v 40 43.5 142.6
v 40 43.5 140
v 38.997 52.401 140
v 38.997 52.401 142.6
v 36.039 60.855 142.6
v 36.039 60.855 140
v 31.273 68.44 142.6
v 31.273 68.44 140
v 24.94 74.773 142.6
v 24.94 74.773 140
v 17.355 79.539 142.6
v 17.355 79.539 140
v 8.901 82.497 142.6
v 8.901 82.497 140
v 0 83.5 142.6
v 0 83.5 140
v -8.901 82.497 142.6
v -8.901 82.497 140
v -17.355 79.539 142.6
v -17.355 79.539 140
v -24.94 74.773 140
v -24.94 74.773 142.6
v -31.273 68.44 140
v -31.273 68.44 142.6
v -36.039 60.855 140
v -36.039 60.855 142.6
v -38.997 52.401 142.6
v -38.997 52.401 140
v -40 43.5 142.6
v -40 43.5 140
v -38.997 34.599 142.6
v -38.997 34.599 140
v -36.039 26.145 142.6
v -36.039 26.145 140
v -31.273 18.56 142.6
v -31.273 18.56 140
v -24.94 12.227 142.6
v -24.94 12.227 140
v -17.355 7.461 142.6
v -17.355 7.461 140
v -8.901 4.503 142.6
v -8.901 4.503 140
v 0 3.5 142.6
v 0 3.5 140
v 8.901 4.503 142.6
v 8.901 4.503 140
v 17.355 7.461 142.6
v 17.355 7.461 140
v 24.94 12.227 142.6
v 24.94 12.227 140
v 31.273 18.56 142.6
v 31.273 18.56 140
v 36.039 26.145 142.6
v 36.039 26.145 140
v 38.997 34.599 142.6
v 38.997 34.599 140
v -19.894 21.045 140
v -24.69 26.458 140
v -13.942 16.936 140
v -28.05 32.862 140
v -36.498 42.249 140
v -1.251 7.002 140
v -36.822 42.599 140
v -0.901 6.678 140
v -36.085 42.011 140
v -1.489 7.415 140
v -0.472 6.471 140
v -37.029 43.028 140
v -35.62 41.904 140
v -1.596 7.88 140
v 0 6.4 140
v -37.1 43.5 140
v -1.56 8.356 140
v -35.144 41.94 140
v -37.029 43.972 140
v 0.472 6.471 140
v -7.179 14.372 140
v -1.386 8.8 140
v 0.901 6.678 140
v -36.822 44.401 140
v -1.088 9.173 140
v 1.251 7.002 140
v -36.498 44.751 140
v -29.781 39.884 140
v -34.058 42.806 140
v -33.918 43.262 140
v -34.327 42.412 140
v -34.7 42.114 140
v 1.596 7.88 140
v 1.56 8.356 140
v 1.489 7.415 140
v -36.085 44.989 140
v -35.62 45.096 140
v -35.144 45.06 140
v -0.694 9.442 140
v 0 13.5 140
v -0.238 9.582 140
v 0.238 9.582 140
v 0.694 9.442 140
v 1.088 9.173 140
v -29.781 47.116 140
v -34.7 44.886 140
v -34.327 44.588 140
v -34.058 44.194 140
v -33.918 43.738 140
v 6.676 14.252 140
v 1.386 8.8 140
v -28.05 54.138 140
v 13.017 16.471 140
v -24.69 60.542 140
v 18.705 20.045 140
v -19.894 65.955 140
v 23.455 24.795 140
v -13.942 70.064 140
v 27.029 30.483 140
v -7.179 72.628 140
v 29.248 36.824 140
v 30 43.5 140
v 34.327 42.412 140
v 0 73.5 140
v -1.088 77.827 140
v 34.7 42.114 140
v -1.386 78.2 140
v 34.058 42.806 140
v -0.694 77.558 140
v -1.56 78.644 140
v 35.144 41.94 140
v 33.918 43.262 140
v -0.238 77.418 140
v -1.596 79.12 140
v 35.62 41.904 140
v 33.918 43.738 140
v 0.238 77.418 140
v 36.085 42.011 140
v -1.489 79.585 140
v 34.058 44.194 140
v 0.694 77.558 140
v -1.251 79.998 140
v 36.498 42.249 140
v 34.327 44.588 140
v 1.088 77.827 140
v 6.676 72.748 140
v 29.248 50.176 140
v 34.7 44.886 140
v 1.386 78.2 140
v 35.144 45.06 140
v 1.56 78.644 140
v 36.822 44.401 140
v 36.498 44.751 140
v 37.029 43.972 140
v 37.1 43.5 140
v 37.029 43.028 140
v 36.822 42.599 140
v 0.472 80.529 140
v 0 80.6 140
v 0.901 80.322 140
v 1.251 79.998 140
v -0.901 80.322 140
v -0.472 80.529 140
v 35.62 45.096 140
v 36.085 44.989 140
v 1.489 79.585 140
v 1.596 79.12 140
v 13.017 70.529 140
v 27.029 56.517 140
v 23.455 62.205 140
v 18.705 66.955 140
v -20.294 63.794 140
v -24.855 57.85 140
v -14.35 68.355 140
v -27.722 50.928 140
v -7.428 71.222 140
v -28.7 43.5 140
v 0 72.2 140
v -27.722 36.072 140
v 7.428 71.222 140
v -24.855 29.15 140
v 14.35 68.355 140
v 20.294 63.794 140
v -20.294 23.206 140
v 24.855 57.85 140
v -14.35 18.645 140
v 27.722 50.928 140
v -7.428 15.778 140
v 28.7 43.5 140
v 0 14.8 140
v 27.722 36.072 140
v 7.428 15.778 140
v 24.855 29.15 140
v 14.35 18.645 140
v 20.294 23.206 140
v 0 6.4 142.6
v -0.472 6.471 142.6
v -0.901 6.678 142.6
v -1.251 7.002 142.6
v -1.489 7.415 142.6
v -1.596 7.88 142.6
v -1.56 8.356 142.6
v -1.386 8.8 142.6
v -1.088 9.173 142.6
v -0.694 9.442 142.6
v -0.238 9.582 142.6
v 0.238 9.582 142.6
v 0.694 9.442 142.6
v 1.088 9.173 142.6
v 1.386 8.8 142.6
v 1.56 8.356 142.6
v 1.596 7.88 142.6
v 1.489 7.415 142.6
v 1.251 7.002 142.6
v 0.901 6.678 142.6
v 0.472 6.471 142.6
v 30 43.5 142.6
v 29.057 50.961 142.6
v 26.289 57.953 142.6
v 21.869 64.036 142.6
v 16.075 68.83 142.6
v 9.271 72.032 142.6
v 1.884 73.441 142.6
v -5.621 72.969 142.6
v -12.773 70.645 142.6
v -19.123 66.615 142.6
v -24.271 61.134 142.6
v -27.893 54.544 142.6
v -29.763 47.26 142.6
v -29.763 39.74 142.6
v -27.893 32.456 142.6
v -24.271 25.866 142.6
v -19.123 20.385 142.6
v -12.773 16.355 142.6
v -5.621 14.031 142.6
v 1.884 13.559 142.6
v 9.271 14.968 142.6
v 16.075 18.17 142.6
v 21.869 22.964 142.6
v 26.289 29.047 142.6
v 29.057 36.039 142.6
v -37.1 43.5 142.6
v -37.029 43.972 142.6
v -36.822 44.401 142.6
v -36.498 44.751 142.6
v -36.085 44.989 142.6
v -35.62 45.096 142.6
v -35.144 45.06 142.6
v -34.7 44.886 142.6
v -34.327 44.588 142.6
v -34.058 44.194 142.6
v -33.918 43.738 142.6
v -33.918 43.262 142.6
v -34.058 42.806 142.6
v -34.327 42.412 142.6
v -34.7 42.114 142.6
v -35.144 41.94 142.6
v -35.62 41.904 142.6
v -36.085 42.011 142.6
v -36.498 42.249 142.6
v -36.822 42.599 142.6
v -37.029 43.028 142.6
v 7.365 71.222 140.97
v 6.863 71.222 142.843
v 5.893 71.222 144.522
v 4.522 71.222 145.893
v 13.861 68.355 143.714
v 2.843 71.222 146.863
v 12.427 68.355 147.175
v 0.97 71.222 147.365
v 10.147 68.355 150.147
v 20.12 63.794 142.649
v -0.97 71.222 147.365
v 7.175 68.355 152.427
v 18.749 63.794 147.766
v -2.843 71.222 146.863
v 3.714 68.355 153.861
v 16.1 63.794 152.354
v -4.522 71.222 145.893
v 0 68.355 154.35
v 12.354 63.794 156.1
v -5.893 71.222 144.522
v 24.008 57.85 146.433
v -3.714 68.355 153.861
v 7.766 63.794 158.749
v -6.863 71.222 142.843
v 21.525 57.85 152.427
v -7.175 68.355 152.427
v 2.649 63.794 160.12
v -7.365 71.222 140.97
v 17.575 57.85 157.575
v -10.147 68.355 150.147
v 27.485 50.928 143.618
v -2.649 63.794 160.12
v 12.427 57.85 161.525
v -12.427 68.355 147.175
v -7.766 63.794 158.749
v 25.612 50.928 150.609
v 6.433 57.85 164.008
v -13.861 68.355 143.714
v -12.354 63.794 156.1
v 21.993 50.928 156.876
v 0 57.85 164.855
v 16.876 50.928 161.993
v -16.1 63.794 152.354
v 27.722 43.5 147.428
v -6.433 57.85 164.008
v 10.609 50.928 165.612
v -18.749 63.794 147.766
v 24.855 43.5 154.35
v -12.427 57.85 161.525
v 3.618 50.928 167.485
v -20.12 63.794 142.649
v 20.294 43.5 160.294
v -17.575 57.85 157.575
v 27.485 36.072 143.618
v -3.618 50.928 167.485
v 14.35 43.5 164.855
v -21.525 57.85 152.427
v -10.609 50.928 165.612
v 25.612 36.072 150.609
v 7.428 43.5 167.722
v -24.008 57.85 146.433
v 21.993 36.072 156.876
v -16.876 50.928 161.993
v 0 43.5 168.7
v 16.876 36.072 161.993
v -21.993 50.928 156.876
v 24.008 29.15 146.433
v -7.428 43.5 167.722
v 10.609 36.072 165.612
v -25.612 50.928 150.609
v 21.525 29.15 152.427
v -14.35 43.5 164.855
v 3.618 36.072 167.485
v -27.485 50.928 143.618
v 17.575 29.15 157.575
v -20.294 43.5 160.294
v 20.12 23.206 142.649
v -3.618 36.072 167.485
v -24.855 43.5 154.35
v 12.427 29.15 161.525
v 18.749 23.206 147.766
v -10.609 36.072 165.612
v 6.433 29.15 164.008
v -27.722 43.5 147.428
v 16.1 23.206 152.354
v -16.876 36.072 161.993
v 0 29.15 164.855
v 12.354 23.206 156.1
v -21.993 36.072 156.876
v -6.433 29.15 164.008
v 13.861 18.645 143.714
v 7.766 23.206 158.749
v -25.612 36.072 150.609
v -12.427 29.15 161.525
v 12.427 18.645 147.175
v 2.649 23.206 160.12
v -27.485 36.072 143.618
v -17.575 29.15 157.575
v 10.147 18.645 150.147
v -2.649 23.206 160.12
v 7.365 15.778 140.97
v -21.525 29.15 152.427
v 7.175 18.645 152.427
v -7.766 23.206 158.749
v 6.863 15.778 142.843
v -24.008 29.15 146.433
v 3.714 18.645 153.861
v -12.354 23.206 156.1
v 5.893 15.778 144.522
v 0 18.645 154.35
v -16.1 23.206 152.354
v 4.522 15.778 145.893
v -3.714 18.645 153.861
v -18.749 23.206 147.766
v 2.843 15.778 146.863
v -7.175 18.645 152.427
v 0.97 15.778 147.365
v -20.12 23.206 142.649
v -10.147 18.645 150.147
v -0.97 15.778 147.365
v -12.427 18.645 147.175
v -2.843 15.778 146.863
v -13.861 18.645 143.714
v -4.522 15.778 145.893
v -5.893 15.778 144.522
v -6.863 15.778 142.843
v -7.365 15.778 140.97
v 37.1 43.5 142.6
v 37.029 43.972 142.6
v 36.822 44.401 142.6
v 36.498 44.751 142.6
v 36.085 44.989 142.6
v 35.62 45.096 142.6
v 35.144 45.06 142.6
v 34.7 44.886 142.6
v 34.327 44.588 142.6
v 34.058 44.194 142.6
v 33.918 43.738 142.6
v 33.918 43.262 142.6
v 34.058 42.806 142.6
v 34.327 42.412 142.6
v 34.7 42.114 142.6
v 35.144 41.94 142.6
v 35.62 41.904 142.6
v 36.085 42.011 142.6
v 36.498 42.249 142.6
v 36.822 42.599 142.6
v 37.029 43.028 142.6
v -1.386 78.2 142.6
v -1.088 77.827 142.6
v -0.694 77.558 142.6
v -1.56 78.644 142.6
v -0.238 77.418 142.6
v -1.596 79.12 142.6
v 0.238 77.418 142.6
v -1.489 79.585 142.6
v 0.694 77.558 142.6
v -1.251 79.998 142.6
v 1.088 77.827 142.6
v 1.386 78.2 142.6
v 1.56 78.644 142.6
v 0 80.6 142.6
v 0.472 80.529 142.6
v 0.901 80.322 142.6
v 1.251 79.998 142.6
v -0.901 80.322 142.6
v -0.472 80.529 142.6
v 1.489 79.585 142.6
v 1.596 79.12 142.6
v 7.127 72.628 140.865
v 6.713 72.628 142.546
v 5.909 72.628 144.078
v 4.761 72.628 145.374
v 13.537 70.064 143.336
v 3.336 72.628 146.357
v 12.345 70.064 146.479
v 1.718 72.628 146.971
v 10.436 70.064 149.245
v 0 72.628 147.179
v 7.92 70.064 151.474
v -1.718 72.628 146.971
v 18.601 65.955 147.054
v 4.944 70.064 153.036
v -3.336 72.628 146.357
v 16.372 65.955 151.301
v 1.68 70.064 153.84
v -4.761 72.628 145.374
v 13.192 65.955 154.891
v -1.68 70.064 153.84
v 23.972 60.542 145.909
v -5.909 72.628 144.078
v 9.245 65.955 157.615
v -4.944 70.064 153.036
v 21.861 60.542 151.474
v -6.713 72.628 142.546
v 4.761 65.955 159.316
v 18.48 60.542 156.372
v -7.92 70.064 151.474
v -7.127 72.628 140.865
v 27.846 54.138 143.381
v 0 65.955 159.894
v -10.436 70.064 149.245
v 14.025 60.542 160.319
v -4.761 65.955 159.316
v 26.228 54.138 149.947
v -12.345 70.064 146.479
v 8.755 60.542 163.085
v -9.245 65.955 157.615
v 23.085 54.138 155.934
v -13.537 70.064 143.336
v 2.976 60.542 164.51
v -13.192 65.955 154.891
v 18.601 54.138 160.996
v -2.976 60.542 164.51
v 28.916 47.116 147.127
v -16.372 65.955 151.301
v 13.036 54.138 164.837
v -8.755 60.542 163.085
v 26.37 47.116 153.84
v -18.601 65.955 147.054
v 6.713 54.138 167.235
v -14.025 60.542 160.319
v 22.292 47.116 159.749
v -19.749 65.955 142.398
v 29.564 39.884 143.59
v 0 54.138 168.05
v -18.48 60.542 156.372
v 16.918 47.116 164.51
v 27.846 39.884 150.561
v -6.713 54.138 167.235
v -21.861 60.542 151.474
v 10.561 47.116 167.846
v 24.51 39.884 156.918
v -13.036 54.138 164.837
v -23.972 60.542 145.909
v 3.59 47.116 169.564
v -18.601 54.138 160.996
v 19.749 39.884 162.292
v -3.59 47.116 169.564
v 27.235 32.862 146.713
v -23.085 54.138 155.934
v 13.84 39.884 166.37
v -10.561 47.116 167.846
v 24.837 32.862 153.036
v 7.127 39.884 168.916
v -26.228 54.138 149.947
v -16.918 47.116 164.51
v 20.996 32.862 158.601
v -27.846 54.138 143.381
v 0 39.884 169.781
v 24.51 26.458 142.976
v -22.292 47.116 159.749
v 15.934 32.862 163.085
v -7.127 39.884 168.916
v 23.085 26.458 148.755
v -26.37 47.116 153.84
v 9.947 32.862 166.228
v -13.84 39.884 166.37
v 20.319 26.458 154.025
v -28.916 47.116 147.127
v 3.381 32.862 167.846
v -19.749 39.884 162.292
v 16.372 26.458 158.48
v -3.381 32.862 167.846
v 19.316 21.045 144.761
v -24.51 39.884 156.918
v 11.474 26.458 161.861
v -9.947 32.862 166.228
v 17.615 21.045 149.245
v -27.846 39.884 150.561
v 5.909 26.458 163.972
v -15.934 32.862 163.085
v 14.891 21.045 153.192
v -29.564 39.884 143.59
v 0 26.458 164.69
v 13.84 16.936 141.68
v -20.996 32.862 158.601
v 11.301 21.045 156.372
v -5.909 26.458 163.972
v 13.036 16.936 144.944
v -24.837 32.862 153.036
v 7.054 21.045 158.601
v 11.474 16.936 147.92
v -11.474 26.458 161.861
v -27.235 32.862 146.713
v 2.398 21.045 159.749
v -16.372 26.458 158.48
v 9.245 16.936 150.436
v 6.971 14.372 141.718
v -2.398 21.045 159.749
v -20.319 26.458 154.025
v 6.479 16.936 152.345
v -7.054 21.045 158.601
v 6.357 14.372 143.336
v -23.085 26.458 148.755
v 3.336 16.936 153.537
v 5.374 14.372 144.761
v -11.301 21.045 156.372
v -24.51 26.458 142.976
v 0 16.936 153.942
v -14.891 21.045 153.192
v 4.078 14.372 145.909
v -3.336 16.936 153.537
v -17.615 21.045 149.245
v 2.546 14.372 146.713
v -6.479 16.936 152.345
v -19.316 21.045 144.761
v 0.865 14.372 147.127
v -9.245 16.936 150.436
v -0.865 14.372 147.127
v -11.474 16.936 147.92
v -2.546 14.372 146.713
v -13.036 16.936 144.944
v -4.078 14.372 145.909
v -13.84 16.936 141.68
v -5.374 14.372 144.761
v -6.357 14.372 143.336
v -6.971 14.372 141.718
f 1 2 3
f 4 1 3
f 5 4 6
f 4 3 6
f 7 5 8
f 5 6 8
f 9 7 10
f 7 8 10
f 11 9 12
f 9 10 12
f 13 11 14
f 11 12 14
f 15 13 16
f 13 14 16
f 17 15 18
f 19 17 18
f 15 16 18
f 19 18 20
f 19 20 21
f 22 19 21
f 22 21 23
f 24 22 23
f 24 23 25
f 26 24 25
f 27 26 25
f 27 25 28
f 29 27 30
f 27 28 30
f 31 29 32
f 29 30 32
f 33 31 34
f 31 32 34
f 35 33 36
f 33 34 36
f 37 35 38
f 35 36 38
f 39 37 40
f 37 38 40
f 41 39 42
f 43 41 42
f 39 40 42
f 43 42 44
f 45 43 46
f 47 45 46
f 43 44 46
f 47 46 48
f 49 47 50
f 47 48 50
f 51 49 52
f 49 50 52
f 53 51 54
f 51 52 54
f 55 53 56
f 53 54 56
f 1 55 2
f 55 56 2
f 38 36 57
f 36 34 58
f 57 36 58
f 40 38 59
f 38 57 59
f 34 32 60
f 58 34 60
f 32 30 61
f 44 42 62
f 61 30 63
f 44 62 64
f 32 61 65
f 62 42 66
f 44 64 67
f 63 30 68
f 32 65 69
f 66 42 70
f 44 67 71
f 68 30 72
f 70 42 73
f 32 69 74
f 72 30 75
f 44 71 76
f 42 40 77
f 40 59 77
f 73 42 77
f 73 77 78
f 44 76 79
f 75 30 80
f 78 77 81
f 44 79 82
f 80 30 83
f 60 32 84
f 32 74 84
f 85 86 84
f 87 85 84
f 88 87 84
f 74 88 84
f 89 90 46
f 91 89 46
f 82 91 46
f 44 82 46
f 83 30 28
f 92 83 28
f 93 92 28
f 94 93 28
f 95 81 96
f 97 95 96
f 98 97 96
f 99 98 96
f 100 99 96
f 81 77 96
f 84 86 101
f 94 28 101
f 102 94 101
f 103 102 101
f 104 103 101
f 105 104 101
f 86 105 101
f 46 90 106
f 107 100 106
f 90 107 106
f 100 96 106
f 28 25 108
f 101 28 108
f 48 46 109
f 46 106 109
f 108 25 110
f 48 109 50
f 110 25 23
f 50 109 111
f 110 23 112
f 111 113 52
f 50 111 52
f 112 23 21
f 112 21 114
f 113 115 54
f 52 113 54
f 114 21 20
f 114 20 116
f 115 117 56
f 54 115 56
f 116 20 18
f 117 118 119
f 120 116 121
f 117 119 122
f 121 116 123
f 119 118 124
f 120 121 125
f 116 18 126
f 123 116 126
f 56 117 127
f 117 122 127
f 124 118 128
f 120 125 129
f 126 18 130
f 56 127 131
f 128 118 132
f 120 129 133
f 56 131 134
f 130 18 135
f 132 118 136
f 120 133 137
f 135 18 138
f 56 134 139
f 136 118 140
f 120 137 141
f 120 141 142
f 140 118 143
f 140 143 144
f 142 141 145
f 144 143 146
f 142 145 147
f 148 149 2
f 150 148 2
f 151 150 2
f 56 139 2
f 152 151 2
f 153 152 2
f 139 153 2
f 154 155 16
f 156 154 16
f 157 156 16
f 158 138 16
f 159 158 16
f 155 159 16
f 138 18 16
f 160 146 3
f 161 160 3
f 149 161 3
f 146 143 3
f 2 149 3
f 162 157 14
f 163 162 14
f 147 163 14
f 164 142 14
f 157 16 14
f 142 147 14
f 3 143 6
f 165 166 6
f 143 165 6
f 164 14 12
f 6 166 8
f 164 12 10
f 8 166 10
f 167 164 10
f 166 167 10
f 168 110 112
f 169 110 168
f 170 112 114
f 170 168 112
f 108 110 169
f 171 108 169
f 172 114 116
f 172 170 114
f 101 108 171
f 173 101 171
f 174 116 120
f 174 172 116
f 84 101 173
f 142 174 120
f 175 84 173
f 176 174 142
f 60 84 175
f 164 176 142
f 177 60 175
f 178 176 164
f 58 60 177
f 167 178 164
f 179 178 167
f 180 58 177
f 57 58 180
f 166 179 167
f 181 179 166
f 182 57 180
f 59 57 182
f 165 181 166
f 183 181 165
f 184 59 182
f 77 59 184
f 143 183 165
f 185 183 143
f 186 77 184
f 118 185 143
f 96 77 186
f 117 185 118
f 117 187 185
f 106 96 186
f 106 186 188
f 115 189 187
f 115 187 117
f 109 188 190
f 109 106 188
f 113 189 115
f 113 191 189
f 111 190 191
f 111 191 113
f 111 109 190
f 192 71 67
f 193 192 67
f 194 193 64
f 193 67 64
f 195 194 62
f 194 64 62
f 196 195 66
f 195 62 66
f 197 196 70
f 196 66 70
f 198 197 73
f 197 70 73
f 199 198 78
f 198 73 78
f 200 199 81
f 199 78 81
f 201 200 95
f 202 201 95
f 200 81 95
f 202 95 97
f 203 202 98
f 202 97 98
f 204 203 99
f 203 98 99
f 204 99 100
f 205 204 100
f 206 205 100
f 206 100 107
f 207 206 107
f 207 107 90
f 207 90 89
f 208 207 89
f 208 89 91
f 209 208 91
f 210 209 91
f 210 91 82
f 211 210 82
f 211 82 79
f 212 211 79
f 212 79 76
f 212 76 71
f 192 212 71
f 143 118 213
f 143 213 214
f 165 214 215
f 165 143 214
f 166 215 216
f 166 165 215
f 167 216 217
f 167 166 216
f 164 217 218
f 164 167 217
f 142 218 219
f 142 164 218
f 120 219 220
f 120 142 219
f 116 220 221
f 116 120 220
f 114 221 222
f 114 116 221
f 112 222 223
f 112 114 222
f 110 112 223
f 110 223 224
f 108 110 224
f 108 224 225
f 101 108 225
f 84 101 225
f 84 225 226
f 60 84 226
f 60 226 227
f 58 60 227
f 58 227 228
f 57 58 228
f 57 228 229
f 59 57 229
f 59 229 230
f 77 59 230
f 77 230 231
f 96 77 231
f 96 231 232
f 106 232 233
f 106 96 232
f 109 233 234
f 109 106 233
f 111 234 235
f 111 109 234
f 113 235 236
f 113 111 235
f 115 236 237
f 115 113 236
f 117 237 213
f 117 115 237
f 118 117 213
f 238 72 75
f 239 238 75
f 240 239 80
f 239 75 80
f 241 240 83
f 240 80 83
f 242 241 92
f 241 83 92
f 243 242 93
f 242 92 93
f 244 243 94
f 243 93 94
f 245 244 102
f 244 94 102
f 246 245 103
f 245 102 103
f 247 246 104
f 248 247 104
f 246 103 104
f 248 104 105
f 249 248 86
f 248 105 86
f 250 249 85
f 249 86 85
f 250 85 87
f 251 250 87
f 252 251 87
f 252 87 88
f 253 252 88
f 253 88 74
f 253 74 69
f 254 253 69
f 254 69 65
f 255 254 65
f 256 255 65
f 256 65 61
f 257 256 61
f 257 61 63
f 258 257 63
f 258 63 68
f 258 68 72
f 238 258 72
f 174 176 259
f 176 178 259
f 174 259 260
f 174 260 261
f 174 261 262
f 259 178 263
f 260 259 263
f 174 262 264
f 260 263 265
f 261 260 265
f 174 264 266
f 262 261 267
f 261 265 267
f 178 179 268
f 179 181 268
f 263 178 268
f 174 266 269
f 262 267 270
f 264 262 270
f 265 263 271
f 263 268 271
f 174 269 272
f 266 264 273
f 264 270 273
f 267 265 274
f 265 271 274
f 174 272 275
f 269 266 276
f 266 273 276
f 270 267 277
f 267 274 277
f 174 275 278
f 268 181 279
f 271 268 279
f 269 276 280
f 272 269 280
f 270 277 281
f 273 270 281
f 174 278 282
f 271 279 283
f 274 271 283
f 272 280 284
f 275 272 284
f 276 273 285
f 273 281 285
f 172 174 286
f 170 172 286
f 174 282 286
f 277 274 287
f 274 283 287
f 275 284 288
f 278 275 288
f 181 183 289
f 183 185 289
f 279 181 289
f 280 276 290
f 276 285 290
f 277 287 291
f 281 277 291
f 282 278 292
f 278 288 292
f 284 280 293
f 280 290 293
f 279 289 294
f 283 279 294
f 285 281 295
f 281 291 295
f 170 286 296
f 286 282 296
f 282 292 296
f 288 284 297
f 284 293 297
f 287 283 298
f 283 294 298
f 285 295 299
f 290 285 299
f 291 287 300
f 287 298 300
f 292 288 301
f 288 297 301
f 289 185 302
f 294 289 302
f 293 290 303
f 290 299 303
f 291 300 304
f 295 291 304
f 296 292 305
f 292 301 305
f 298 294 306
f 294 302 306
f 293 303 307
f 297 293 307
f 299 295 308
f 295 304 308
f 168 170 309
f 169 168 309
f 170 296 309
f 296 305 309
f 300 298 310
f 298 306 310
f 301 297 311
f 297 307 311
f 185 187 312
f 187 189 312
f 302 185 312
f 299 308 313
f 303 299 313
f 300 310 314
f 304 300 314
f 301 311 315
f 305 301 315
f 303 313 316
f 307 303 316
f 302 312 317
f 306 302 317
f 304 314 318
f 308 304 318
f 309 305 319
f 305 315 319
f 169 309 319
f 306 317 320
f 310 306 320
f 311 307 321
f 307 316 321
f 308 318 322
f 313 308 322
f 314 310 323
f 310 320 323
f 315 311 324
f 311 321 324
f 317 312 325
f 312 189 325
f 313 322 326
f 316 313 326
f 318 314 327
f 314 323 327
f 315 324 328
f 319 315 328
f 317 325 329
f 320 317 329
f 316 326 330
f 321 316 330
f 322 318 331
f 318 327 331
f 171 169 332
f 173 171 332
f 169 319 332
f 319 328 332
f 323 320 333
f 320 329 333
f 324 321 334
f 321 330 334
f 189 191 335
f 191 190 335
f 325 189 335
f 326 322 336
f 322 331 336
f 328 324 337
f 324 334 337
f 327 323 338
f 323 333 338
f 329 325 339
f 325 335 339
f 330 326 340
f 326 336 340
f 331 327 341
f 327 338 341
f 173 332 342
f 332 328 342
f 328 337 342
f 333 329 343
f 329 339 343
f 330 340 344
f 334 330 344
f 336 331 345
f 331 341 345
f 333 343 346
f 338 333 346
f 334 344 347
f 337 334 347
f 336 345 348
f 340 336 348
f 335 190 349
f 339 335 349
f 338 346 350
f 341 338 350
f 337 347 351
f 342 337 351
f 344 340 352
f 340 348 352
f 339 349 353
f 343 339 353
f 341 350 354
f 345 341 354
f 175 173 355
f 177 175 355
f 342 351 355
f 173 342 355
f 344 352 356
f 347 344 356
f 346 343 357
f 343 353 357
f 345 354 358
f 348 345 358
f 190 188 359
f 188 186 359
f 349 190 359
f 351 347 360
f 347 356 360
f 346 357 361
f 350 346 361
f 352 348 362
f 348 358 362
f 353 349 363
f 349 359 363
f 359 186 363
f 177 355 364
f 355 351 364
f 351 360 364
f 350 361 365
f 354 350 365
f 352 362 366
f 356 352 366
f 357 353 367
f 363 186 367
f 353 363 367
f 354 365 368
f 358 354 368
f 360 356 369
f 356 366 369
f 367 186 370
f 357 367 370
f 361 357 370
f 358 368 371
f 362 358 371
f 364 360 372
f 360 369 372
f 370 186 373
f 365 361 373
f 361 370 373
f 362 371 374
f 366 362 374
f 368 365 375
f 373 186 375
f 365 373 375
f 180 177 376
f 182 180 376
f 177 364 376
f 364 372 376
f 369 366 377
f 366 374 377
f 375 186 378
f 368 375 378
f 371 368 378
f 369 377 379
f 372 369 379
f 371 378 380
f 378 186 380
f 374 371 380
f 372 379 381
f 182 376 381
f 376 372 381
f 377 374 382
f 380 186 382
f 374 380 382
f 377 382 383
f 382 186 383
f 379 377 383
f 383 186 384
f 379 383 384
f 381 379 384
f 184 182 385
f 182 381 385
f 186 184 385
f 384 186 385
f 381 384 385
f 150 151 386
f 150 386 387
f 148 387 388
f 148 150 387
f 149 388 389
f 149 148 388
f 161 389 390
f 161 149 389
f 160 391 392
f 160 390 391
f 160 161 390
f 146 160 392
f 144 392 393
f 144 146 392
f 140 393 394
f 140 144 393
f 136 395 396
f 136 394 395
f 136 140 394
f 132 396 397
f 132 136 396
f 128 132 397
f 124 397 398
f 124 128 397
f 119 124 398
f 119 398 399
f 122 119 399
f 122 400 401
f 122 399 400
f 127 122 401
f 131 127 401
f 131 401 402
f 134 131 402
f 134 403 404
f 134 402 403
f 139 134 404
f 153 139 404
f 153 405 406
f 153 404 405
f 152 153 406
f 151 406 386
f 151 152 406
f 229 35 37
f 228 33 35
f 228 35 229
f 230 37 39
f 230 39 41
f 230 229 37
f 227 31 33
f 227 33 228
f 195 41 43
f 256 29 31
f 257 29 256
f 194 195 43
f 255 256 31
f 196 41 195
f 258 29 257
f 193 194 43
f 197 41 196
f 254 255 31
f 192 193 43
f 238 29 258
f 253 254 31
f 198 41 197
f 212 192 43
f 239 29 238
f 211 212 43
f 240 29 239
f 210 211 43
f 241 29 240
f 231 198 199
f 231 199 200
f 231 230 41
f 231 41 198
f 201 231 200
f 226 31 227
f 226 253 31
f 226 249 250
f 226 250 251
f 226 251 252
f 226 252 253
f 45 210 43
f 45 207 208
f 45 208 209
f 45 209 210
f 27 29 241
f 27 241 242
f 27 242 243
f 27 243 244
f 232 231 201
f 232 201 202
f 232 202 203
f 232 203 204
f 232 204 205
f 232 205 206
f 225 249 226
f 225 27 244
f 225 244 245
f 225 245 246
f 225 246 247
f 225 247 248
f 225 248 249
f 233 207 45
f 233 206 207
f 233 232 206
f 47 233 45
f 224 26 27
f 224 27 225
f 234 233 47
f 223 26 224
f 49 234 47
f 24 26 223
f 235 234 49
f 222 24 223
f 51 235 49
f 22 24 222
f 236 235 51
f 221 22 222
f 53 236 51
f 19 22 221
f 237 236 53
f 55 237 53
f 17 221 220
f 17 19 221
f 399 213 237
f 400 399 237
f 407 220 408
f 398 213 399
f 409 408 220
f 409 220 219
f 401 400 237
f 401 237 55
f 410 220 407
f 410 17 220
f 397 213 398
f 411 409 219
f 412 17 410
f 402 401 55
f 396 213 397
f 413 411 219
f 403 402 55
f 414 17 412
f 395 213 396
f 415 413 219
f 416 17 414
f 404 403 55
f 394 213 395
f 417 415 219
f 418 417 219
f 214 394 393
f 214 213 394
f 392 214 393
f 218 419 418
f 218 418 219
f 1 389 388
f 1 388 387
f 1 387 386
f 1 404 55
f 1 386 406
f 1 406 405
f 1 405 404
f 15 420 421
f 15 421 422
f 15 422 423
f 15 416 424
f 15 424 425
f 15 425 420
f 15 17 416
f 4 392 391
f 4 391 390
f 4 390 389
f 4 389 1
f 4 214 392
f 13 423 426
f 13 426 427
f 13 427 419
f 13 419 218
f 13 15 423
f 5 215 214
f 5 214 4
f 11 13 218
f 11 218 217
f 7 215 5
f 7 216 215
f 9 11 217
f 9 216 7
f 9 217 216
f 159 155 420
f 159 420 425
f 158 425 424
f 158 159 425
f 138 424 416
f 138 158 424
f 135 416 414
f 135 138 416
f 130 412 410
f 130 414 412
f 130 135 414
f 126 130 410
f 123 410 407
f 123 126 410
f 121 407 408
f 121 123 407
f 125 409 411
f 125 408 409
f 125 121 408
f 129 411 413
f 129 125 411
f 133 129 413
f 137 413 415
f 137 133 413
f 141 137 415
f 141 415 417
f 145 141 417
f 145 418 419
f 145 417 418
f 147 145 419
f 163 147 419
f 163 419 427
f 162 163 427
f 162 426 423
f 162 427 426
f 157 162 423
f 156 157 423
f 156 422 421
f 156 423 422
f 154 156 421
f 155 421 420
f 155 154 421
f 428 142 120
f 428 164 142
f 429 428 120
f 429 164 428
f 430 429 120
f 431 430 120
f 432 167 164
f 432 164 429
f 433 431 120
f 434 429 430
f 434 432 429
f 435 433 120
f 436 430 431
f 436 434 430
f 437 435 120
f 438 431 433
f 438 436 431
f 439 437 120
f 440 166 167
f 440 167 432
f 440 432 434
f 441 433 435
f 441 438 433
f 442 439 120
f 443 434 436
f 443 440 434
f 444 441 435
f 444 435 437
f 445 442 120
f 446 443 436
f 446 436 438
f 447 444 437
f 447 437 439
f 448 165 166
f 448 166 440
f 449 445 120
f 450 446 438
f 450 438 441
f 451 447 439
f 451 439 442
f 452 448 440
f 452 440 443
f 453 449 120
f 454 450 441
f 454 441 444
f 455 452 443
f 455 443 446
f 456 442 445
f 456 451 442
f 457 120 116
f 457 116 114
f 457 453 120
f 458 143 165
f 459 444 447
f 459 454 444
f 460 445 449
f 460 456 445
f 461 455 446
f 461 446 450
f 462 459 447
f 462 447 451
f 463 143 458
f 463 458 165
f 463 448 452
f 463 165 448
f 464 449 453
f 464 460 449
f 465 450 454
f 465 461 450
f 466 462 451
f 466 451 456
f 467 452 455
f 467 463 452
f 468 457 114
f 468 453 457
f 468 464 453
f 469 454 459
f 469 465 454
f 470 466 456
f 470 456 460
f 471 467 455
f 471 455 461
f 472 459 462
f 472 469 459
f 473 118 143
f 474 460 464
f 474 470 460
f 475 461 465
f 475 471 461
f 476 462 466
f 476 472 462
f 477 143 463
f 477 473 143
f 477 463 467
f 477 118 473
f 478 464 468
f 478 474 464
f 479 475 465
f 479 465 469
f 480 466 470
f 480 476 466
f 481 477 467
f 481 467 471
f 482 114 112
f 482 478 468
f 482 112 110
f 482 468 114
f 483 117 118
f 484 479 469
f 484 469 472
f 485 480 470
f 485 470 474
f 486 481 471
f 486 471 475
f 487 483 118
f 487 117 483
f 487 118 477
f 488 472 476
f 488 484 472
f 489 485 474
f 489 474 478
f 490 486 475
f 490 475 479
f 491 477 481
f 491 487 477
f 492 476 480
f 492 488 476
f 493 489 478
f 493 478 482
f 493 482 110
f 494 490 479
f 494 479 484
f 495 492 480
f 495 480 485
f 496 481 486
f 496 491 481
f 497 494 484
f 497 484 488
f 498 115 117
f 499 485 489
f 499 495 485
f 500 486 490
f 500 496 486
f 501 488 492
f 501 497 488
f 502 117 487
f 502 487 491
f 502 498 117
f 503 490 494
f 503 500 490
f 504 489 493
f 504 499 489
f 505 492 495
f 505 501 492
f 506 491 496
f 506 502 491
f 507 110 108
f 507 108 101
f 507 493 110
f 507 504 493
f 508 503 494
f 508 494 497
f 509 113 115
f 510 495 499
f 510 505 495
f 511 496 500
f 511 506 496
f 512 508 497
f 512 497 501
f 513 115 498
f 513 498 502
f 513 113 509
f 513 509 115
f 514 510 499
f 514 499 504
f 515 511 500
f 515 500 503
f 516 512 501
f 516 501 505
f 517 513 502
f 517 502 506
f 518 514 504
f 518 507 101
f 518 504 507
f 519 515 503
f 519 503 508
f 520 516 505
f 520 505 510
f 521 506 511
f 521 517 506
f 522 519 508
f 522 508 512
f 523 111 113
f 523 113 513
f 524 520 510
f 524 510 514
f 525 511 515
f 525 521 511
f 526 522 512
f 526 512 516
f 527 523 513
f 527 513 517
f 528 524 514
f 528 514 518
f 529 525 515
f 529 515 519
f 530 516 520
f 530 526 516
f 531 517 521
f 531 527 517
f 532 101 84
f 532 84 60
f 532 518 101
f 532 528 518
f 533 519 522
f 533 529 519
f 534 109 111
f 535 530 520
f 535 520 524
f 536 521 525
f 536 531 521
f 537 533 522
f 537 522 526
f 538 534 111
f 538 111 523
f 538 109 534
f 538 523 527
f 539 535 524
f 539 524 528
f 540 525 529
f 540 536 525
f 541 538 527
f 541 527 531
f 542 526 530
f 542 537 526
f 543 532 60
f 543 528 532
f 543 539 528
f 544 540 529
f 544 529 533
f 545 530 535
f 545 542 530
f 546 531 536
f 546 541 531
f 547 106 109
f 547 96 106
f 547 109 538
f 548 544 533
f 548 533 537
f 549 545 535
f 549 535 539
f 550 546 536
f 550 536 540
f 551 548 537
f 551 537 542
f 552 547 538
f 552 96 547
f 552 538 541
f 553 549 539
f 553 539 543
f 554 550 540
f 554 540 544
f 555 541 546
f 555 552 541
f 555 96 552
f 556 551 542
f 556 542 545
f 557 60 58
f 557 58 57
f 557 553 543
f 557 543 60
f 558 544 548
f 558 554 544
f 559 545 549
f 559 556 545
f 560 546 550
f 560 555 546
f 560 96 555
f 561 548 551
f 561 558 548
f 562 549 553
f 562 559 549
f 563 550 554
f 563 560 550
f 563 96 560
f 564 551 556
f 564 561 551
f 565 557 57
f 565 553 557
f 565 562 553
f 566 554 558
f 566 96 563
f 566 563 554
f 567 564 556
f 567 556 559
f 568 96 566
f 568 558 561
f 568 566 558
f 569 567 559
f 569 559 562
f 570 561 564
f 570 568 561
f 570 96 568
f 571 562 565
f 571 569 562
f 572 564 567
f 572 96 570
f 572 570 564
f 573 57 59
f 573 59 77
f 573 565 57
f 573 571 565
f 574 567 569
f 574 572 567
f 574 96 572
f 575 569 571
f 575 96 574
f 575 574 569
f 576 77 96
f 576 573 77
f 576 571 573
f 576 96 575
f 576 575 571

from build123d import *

# Parameters (mm, degrees)
CYLINDER005_R             = 1.6
CYLINDER005_DEPTH         = 10
CYLINDER004_R             = 1.6
CYLINDER004_DEPTH         = 10
FUSION001_PLACEMENT_ANGLE = 90
CYLINDER003_R             = 1.6
CYLINDER003_DEPTH         = 10
CYLINDER002_R             = 1.6
CYLINDER002_DEPTH         = 10
CYLINDER001_R             = 30
CYLINDER001_DEPTH         = 2.6
CYLINDER_R                = 40
CYLINDER_DEPTH            = 2.6
SPHERE001_ANGLE           = 180
SPHERE_ANGLE              = 180


with BuildPart() as cylinder005:
    # Cylinder005 → Cylinder005 (new body)
    with BuildSketch(Plane(origin=(35.5, 0, 0), x_dir=(1, 0, 0), z_dir=(0, 0, 1))):
        Circle(CYLINDER005_R)
    extrude(amount=CYLINDER005_DEPTH)


with BuildPart() as part_mirroring001:
    # Part__Mirroring001: instance of Cylinder005
    add(cylinder005.part.mirror(Plane(origin=(0, 0, 0), x_dir=(0, -1, 0), z_dir=(1, 0, 0))))


with BuildPart() as hole002:
    # Cylinder004 → Cylinder004 (new body)
    with BuildSketch(Plane(origin=(35.5, 0, 0), x_dir=(1, 0, 0), z_dir=(0, 0, 1))):
        Circle(CYLINDER004_R)
    extrude(amount=CYLINDER004_DEPTH)

    # Fusion001: union Part__Mirroring001
    add(part_mirroring001.part)


with BuildPart() as hole002_1:
    # Fusion001 placement: moved
    add(hole002.part.rotate(Axis((0, 0, 0), (0, 0, 1)), FUSION001_PLACEMENT_ANGLE))


with BuildPart() as cylinder003:
    # Cylinder003 → Cylinder003 (new body)
    with BuildSketch(Plane(origin=(35.5, 0, 0), x_dir=(1, 0, 0), z_dir=(0, 0, 1))):
        Circle(CYLINDER003_R)
    extrude(amount=CYLINDER003_DEPTH)


with BuildPart() as part_mirroring:
    # Part__Mirroring: instance of Cylinder003
    add(cylinder003.part.mirror(Plane(origin=(0, 0, 0), x_dir=(0, -1, 0), z_dir=(1, 0, 0))))


with BuildPart() as holes:
    # Cylinder002 → Cylinder002 (new body)
    with BuildSketch(Plane(origin=(35.5, 0, 0), x_dir=(1, 0, 0), z_dir=(0, 0, 1))):
        Circle(CYLINDER002_R)
    extrude(amount=CYLINDER002_DEPTH)

    # Fusion178: union Part__Mirroring
    add(part_mirroring.part)

    # Fusion002: union hole002
    add(hole002_1.part)


with BuildPart() as holes_1:
    # Fusion002 placement: moved
    add(holes.part.moved(Location((0, 0, -4))))


with BuildPart() as cylinder_in:
    # Cylinder001 → Cylinder001 (new body)
    with BuildSketch(Plane.XY):
        Circle(CYLINDER001_R)
    extrude(amount=CYLINDER001_DEPTH)


with BuildPart() as cut004:
    # Cylinder → Cylinder (new body)
    with BuildSketch(Plane.XY):
        Circle(CYLINDER_R)
    extrude(amount=CYLINDER_DEPTH)

    # Cut003: cut Cylinder_in
    add(cylinder_in.part, mode=Mode.SUBTRACT)

    # Cut004: cut Holes
    add(holes_1.part, mode=Mode.SUBTRACT)


with BuildPart() as sphere_in:
    # Sphere001 → Sphere001 (revolve)
    with BuildSketch(Plane(origin=(0, 0, 0), x_dir=(1, 0, 0), z_dir=(0, 0, -1))):
        with BuildLine():
            ThreePointArc((0, -28.7), (28.7, 0), (0, 28.7))
            Line((0, 28.7), (0, -28.7))
        make_face()
    revolve(axis=Axis((0, 0, 0), (0, -1, 0)), revolution_arc=SPHERE001_ANGLE)


with BuildPart() as lightdome:
    # Sphere → Sphere (revolve)
    with BuildSketch(Plane(origin=(0, 0, 0), x_dir=(1, 0, 0), z_dir=(0, 0, -1))):
        with BuildLine():
            ThreePointArc((0, -30), (30, 0), (0, 30))
            Line((0, 30), (0, -30))
        make_face()
    revolve(axis=Axis((0, 0, 0), (0, -1, 0)), revolution_arc=SPHERE_ANGLE)

    # Cut002: cut Sphere_in
    add(sphere_in.part, mode=Mode.SUBTRACT)

    # Fusion004: union Cut004
    add(cut004.part)


with BuildPart() as lightdome_1:
    # Fusion004 placement: moved
    add(lightdome.part.moved(Location((0, 43.5, 140))))


solid = lightdome_1.part
